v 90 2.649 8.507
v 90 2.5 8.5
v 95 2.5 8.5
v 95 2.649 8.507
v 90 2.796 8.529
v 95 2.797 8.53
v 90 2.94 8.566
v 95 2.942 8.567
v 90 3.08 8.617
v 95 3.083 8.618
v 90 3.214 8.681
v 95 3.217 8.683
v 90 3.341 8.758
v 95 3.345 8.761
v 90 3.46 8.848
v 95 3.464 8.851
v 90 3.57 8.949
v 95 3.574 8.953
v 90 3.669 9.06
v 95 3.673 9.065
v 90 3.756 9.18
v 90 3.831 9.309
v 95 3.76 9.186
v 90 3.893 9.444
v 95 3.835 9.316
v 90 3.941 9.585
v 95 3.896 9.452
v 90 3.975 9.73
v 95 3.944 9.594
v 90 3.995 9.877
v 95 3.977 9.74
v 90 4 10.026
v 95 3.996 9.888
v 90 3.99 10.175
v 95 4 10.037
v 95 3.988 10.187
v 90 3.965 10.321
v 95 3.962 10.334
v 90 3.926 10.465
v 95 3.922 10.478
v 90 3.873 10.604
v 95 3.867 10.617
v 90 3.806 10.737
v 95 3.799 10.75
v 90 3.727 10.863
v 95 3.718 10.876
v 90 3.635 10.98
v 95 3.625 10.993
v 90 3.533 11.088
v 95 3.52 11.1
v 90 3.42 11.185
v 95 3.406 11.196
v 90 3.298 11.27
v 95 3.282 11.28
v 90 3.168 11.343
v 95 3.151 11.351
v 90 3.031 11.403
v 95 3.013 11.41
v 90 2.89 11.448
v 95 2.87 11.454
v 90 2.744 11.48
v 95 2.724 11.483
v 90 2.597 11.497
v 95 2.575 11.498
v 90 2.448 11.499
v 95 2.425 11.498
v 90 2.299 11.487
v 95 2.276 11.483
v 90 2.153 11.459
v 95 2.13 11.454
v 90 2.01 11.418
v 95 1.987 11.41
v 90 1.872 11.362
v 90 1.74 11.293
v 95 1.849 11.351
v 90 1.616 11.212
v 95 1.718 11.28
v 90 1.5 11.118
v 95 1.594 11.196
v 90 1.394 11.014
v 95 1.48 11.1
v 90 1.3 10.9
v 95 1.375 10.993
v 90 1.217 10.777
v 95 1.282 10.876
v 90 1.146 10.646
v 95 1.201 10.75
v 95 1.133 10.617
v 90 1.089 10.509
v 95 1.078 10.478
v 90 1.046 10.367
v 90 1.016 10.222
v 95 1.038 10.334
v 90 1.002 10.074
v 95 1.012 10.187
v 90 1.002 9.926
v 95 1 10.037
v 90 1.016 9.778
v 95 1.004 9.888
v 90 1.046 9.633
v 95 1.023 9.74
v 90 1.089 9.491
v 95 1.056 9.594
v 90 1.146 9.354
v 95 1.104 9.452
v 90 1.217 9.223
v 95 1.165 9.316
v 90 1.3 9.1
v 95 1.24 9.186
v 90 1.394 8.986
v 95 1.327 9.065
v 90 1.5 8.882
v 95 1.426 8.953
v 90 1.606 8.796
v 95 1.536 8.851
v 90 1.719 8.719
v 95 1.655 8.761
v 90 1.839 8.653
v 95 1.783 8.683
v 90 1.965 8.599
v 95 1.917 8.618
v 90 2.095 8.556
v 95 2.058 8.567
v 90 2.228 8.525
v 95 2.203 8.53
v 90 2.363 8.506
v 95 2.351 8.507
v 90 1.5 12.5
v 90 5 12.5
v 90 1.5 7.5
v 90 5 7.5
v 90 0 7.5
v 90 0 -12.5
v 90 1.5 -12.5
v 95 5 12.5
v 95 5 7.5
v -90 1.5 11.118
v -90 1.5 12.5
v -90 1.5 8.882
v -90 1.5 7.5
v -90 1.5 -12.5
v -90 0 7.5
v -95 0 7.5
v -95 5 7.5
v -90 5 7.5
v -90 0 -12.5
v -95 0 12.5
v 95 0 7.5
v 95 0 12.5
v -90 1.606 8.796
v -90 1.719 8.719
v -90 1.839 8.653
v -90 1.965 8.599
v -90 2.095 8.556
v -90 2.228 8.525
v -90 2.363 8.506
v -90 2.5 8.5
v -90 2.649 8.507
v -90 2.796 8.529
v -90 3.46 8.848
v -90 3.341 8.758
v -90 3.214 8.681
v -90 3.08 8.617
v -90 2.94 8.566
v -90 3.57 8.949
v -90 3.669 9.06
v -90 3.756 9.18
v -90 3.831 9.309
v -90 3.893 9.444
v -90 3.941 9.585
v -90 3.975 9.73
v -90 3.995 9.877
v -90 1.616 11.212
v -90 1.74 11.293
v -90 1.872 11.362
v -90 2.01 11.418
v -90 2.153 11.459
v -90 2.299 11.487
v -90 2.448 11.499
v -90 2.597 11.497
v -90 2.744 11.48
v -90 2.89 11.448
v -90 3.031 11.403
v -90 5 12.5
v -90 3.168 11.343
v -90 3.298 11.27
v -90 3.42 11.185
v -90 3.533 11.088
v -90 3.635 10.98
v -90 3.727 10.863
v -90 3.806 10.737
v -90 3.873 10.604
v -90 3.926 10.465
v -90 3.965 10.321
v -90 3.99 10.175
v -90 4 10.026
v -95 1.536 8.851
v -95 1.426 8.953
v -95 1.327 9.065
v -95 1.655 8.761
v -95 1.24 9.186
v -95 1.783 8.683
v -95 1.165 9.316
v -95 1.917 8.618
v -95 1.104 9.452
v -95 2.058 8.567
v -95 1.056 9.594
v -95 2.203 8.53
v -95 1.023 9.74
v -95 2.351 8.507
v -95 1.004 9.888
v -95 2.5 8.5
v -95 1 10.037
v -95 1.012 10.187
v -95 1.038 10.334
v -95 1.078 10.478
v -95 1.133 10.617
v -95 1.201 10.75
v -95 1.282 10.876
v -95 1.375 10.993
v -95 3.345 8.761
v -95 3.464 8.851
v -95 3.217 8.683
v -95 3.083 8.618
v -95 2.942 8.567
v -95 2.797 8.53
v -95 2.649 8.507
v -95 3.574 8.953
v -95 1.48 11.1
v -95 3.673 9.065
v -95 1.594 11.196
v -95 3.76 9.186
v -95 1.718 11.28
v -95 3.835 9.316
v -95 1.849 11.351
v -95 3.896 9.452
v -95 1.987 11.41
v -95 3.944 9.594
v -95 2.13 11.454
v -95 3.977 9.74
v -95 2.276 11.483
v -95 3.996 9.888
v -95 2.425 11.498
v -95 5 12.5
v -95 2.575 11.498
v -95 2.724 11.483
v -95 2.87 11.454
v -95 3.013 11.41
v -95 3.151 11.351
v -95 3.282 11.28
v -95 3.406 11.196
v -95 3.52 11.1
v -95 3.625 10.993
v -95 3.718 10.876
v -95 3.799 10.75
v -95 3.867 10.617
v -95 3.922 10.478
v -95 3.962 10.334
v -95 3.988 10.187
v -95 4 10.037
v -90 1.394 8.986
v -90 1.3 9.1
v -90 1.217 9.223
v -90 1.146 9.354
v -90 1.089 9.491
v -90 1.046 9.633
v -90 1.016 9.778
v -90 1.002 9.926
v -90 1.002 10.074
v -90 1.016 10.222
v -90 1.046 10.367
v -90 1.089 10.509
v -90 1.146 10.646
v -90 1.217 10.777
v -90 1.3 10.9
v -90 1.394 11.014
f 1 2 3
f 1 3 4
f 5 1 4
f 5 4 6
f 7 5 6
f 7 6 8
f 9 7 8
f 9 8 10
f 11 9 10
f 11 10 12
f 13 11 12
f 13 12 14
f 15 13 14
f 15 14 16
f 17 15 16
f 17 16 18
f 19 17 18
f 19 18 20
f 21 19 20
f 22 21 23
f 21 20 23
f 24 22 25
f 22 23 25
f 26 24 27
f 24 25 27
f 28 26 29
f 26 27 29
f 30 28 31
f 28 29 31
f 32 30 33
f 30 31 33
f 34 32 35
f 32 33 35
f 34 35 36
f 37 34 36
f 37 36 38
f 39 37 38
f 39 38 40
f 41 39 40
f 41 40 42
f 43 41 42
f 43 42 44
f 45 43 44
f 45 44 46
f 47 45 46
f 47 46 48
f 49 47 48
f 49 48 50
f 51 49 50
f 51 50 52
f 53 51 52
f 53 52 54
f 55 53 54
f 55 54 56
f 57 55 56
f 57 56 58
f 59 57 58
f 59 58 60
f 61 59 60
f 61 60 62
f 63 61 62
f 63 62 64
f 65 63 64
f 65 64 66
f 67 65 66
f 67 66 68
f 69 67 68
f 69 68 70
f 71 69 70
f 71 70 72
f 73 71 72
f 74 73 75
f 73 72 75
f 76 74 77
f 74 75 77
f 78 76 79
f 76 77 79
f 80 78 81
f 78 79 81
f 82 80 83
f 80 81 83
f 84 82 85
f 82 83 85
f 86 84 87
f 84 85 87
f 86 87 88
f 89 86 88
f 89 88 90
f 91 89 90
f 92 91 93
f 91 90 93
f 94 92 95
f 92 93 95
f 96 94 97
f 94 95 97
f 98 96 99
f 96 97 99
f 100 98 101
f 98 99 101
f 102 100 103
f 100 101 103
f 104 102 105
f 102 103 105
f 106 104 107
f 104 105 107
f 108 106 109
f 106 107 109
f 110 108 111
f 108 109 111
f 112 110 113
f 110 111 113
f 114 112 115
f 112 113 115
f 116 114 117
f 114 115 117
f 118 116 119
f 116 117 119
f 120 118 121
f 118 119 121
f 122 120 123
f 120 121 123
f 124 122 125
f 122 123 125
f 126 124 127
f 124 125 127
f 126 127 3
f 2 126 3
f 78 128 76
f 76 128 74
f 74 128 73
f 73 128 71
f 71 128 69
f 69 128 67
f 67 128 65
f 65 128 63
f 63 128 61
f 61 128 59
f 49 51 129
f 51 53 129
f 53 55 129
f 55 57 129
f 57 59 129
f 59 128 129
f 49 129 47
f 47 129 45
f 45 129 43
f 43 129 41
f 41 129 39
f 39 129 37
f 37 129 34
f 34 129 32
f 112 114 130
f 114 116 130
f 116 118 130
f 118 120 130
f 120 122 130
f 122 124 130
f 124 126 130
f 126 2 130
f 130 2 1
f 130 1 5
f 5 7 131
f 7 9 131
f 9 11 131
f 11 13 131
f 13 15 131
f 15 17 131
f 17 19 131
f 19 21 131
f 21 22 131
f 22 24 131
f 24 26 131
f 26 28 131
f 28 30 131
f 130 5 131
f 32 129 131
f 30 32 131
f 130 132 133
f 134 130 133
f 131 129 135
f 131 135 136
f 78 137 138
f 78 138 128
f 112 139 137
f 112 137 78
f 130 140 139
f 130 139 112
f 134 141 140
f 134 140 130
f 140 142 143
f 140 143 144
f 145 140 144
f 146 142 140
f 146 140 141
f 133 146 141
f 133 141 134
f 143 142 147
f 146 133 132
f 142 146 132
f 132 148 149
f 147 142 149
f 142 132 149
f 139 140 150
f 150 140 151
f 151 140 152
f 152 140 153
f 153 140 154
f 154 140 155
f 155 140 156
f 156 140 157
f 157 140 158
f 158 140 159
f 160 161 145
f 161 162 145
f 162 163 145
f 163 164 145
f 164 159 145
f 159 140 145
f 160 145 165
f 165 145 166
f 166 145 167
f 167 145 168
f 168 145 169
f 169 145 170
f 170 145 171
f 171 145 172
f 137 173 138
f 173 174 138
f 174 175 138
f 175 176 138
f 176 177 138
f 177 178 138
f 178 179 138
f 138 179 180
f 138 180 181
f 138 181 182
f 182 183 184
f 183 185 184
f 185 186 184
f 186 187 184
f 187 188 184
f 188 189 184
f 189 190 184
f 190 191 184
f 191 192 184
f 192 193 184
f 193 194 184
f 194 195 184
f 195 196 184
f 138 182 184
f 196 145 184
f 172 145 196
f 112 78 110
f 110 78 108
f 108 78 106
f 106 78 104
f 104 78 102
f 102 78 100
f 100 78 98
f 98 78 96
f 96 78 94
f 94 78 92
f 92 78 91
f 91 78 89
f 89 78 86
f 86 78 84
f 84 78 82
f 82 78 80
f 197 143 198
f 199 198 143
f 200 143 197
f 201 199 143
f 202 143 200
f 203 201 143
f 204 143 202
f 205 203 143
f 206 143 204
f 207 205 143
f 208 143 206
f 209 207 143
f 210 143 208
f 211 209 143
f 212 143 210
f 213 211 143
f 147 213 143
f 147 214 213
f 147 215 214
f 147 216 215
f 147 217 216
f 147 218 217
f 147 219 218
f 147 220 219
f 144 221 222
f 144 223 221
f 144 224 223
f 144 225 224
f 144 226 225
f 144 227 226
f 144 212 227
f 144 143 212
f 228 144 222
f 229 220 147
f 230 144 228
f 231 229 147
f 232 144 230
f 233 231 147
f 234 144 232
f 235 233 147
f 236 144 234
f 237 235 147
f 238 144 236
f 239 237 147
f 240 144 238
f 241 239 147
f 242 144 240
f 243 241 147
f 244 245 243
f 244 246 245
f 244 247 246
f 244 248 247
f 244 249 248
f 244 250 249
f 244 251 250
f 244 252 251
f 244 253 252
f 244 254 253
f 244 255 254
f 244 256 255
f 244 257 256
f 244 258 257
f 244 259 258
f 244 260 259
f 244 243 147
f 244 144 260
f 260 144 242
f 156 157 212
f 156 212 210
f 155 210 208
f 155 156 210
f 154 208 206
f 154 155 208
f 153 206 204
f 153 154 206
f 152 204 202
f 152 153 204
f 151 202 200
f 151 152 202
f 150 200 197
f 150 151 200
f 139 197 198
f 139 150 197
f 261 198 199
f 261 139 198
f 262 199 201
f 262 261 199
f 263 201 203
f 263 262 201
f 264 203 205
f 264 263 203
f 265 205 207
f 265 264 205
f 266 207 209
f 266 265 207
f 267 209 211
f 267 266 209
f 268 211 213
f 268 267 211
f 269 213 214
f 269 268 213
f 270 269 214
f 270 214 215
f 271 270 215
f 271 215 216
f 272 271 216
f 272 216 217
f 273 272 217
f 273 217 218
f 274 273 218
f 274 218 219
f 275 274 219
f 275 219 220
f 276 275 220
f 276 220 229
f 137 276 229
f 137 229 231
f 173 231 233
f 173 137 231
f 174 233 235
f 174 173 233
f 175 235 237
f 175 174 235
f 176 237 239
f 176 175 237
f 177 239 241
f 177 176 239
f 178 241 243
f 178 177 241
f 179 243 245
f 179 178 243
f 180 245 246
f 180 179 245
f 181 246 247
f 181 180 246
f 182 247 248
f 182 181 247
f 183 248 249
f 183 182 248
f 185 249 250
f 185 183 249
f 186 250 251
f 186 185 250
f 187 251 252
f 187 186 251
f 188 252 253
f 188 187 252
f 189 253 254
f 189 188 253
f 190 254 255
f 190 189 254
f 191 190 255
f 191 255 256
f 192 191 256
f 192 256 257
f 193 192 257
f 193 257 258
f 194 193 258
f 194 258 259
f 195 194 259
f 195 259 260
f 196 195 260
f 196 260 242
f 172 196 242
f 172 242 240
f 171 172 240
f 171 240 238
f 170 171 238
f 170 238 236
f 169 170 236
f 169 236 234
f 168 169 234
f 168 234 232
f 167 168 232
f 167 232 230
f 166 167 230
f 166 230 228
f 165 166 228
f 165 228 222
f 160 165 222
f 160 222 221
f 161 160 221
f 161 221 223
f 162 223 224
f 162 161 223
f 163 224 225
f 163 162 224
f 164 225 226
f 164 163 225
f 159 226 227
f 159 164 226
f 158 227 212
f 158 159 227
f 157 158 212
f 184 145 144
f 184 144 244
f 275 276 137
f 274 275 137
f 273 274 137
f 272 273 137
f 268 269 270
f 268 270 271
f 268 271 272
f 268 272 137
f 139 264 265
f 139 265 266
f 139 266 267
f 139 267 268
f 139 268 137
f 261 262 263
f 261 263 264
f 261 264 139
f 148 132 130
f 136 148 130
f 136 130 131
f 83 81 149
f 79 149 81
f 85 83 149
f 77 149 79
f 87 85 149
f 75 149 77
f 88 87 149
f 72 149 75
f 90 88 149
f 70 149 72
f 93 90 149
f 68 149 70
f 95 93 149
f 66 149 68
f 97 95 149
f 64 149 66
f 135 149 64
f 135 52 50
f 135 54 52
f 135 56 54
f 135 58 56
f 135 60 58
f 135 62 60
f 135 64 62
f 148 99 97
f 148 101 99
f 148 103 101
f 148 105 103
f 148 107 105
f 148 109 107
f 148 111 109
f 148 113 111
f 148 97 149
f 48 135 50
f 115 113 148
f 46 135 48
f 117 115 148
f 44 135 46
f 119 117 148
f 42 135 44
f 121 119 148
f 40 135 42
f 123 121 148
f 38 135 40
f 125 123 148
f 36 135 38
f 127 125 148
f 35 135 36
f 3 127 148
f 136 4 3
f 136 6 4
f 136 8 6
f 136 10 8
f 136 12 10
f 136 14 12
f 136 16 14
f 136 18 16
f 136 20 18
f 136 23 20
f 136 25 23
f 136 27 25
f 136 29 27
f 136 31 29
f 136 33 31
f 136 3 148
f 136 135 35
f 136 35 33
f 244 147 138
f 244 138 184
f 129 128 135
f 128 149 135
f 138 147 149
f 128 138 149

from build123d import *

# Parameters (mm, degrees)
SKIZZE1_W                       = 180
SKIZZE1_H                       = 25
AUFSATZ_LINEAR_AUSTRAGEN1_DEPTH = 1.5
SKIZZE2_W                       = 5
SKIZZE2_H                       = 5
AUFSATZ_LINEAR_AUSTRAGEN2_DEPTH = 5
SKIZZE3_R                       = 1.5
SCHNITT_LINEAR_AUSTRAGEN1_DEPTH = 5
SKIZZE4_W                       = 5
SKIZZE4_H                       = 5
AUFSATZ_LINEAR_AUSTRAGEN3_DEPTH = 5
SCHNITT_LINEAR_START            = -5
SKIZZE5_R                       = 1.5
SCHNITT_LINEAR_AUSTRAGEN2_DEPTH = 5


with BuildPart() as part:
    # Skizze1 → Aufsatz-Linear austragen1 (new body)
    with BuildSketch(Plane(origin=(0, 0, 0), x_dir=(1, 0, 0), z_dir=(0, 1, 0))):
        Rectangle(SKIZZE1_W, SKIZZE1_H)
    extrude(amount=AUFSATZ_LINEAR_AUSTRAGEN1_DEPTH)

    # Skizze2 → Aufsatz-Linear austragen2 (add)
    with BuildSketch(Plane(origin=(90, 0, 0), x_dir=(0, 0, -1), z_dir=(1, 0, 0))):
        with Locations((-10, 2.5)):
            Rectangle(SKIZZE2_W, SKIZZE2_H)
    extrude(amount=AUFSATZ_LINEAR_AUSTRAGEN2_DEPTH)

    # Skizze3 → Schnitt-Linear austragen1 (cut)
    with BuildSketch(Plane(origin=(95, 0, 0), x_dir=(0, 0, -1), z_dir=(1, 0, 0))):
        with Locations((-10, 2.5)):
            Circle(SKIZZE3_R)
    extrude(amount=-SCHNITT_LINEAR_AUSTRAGEN1_DEPTH, mode=Mode.SUBTRACT)

    # Skizze4 → Aufsatz-Linear austragen3 (add)
    with BuildSketch(Plane.ZY.offset(90)):
        with Locations((10, 2.5)):
            Rectangle(SKIZZE4_W, SKIZZE4_H)
    extrude(amount=AUFSATZ_LINEAR_AUSTRAGEN3_DEPTH)

    # Skizze5 → Schnitt-Linear austragen2 (cut)
    with BuildSketch(Plane.ZY.offset(95).offset(SCHNITT_LINEAR_START)):
        with Locations(Location((10, 2.5, 0), (0, 0, 180))):
            Circle(SKIZZE5_R)
    extrude(amount=SCHNITT_LINEAR_AUSTRAGEN2_DEPTH, mode=Mode.SUBTRACT)


solid = part.part
